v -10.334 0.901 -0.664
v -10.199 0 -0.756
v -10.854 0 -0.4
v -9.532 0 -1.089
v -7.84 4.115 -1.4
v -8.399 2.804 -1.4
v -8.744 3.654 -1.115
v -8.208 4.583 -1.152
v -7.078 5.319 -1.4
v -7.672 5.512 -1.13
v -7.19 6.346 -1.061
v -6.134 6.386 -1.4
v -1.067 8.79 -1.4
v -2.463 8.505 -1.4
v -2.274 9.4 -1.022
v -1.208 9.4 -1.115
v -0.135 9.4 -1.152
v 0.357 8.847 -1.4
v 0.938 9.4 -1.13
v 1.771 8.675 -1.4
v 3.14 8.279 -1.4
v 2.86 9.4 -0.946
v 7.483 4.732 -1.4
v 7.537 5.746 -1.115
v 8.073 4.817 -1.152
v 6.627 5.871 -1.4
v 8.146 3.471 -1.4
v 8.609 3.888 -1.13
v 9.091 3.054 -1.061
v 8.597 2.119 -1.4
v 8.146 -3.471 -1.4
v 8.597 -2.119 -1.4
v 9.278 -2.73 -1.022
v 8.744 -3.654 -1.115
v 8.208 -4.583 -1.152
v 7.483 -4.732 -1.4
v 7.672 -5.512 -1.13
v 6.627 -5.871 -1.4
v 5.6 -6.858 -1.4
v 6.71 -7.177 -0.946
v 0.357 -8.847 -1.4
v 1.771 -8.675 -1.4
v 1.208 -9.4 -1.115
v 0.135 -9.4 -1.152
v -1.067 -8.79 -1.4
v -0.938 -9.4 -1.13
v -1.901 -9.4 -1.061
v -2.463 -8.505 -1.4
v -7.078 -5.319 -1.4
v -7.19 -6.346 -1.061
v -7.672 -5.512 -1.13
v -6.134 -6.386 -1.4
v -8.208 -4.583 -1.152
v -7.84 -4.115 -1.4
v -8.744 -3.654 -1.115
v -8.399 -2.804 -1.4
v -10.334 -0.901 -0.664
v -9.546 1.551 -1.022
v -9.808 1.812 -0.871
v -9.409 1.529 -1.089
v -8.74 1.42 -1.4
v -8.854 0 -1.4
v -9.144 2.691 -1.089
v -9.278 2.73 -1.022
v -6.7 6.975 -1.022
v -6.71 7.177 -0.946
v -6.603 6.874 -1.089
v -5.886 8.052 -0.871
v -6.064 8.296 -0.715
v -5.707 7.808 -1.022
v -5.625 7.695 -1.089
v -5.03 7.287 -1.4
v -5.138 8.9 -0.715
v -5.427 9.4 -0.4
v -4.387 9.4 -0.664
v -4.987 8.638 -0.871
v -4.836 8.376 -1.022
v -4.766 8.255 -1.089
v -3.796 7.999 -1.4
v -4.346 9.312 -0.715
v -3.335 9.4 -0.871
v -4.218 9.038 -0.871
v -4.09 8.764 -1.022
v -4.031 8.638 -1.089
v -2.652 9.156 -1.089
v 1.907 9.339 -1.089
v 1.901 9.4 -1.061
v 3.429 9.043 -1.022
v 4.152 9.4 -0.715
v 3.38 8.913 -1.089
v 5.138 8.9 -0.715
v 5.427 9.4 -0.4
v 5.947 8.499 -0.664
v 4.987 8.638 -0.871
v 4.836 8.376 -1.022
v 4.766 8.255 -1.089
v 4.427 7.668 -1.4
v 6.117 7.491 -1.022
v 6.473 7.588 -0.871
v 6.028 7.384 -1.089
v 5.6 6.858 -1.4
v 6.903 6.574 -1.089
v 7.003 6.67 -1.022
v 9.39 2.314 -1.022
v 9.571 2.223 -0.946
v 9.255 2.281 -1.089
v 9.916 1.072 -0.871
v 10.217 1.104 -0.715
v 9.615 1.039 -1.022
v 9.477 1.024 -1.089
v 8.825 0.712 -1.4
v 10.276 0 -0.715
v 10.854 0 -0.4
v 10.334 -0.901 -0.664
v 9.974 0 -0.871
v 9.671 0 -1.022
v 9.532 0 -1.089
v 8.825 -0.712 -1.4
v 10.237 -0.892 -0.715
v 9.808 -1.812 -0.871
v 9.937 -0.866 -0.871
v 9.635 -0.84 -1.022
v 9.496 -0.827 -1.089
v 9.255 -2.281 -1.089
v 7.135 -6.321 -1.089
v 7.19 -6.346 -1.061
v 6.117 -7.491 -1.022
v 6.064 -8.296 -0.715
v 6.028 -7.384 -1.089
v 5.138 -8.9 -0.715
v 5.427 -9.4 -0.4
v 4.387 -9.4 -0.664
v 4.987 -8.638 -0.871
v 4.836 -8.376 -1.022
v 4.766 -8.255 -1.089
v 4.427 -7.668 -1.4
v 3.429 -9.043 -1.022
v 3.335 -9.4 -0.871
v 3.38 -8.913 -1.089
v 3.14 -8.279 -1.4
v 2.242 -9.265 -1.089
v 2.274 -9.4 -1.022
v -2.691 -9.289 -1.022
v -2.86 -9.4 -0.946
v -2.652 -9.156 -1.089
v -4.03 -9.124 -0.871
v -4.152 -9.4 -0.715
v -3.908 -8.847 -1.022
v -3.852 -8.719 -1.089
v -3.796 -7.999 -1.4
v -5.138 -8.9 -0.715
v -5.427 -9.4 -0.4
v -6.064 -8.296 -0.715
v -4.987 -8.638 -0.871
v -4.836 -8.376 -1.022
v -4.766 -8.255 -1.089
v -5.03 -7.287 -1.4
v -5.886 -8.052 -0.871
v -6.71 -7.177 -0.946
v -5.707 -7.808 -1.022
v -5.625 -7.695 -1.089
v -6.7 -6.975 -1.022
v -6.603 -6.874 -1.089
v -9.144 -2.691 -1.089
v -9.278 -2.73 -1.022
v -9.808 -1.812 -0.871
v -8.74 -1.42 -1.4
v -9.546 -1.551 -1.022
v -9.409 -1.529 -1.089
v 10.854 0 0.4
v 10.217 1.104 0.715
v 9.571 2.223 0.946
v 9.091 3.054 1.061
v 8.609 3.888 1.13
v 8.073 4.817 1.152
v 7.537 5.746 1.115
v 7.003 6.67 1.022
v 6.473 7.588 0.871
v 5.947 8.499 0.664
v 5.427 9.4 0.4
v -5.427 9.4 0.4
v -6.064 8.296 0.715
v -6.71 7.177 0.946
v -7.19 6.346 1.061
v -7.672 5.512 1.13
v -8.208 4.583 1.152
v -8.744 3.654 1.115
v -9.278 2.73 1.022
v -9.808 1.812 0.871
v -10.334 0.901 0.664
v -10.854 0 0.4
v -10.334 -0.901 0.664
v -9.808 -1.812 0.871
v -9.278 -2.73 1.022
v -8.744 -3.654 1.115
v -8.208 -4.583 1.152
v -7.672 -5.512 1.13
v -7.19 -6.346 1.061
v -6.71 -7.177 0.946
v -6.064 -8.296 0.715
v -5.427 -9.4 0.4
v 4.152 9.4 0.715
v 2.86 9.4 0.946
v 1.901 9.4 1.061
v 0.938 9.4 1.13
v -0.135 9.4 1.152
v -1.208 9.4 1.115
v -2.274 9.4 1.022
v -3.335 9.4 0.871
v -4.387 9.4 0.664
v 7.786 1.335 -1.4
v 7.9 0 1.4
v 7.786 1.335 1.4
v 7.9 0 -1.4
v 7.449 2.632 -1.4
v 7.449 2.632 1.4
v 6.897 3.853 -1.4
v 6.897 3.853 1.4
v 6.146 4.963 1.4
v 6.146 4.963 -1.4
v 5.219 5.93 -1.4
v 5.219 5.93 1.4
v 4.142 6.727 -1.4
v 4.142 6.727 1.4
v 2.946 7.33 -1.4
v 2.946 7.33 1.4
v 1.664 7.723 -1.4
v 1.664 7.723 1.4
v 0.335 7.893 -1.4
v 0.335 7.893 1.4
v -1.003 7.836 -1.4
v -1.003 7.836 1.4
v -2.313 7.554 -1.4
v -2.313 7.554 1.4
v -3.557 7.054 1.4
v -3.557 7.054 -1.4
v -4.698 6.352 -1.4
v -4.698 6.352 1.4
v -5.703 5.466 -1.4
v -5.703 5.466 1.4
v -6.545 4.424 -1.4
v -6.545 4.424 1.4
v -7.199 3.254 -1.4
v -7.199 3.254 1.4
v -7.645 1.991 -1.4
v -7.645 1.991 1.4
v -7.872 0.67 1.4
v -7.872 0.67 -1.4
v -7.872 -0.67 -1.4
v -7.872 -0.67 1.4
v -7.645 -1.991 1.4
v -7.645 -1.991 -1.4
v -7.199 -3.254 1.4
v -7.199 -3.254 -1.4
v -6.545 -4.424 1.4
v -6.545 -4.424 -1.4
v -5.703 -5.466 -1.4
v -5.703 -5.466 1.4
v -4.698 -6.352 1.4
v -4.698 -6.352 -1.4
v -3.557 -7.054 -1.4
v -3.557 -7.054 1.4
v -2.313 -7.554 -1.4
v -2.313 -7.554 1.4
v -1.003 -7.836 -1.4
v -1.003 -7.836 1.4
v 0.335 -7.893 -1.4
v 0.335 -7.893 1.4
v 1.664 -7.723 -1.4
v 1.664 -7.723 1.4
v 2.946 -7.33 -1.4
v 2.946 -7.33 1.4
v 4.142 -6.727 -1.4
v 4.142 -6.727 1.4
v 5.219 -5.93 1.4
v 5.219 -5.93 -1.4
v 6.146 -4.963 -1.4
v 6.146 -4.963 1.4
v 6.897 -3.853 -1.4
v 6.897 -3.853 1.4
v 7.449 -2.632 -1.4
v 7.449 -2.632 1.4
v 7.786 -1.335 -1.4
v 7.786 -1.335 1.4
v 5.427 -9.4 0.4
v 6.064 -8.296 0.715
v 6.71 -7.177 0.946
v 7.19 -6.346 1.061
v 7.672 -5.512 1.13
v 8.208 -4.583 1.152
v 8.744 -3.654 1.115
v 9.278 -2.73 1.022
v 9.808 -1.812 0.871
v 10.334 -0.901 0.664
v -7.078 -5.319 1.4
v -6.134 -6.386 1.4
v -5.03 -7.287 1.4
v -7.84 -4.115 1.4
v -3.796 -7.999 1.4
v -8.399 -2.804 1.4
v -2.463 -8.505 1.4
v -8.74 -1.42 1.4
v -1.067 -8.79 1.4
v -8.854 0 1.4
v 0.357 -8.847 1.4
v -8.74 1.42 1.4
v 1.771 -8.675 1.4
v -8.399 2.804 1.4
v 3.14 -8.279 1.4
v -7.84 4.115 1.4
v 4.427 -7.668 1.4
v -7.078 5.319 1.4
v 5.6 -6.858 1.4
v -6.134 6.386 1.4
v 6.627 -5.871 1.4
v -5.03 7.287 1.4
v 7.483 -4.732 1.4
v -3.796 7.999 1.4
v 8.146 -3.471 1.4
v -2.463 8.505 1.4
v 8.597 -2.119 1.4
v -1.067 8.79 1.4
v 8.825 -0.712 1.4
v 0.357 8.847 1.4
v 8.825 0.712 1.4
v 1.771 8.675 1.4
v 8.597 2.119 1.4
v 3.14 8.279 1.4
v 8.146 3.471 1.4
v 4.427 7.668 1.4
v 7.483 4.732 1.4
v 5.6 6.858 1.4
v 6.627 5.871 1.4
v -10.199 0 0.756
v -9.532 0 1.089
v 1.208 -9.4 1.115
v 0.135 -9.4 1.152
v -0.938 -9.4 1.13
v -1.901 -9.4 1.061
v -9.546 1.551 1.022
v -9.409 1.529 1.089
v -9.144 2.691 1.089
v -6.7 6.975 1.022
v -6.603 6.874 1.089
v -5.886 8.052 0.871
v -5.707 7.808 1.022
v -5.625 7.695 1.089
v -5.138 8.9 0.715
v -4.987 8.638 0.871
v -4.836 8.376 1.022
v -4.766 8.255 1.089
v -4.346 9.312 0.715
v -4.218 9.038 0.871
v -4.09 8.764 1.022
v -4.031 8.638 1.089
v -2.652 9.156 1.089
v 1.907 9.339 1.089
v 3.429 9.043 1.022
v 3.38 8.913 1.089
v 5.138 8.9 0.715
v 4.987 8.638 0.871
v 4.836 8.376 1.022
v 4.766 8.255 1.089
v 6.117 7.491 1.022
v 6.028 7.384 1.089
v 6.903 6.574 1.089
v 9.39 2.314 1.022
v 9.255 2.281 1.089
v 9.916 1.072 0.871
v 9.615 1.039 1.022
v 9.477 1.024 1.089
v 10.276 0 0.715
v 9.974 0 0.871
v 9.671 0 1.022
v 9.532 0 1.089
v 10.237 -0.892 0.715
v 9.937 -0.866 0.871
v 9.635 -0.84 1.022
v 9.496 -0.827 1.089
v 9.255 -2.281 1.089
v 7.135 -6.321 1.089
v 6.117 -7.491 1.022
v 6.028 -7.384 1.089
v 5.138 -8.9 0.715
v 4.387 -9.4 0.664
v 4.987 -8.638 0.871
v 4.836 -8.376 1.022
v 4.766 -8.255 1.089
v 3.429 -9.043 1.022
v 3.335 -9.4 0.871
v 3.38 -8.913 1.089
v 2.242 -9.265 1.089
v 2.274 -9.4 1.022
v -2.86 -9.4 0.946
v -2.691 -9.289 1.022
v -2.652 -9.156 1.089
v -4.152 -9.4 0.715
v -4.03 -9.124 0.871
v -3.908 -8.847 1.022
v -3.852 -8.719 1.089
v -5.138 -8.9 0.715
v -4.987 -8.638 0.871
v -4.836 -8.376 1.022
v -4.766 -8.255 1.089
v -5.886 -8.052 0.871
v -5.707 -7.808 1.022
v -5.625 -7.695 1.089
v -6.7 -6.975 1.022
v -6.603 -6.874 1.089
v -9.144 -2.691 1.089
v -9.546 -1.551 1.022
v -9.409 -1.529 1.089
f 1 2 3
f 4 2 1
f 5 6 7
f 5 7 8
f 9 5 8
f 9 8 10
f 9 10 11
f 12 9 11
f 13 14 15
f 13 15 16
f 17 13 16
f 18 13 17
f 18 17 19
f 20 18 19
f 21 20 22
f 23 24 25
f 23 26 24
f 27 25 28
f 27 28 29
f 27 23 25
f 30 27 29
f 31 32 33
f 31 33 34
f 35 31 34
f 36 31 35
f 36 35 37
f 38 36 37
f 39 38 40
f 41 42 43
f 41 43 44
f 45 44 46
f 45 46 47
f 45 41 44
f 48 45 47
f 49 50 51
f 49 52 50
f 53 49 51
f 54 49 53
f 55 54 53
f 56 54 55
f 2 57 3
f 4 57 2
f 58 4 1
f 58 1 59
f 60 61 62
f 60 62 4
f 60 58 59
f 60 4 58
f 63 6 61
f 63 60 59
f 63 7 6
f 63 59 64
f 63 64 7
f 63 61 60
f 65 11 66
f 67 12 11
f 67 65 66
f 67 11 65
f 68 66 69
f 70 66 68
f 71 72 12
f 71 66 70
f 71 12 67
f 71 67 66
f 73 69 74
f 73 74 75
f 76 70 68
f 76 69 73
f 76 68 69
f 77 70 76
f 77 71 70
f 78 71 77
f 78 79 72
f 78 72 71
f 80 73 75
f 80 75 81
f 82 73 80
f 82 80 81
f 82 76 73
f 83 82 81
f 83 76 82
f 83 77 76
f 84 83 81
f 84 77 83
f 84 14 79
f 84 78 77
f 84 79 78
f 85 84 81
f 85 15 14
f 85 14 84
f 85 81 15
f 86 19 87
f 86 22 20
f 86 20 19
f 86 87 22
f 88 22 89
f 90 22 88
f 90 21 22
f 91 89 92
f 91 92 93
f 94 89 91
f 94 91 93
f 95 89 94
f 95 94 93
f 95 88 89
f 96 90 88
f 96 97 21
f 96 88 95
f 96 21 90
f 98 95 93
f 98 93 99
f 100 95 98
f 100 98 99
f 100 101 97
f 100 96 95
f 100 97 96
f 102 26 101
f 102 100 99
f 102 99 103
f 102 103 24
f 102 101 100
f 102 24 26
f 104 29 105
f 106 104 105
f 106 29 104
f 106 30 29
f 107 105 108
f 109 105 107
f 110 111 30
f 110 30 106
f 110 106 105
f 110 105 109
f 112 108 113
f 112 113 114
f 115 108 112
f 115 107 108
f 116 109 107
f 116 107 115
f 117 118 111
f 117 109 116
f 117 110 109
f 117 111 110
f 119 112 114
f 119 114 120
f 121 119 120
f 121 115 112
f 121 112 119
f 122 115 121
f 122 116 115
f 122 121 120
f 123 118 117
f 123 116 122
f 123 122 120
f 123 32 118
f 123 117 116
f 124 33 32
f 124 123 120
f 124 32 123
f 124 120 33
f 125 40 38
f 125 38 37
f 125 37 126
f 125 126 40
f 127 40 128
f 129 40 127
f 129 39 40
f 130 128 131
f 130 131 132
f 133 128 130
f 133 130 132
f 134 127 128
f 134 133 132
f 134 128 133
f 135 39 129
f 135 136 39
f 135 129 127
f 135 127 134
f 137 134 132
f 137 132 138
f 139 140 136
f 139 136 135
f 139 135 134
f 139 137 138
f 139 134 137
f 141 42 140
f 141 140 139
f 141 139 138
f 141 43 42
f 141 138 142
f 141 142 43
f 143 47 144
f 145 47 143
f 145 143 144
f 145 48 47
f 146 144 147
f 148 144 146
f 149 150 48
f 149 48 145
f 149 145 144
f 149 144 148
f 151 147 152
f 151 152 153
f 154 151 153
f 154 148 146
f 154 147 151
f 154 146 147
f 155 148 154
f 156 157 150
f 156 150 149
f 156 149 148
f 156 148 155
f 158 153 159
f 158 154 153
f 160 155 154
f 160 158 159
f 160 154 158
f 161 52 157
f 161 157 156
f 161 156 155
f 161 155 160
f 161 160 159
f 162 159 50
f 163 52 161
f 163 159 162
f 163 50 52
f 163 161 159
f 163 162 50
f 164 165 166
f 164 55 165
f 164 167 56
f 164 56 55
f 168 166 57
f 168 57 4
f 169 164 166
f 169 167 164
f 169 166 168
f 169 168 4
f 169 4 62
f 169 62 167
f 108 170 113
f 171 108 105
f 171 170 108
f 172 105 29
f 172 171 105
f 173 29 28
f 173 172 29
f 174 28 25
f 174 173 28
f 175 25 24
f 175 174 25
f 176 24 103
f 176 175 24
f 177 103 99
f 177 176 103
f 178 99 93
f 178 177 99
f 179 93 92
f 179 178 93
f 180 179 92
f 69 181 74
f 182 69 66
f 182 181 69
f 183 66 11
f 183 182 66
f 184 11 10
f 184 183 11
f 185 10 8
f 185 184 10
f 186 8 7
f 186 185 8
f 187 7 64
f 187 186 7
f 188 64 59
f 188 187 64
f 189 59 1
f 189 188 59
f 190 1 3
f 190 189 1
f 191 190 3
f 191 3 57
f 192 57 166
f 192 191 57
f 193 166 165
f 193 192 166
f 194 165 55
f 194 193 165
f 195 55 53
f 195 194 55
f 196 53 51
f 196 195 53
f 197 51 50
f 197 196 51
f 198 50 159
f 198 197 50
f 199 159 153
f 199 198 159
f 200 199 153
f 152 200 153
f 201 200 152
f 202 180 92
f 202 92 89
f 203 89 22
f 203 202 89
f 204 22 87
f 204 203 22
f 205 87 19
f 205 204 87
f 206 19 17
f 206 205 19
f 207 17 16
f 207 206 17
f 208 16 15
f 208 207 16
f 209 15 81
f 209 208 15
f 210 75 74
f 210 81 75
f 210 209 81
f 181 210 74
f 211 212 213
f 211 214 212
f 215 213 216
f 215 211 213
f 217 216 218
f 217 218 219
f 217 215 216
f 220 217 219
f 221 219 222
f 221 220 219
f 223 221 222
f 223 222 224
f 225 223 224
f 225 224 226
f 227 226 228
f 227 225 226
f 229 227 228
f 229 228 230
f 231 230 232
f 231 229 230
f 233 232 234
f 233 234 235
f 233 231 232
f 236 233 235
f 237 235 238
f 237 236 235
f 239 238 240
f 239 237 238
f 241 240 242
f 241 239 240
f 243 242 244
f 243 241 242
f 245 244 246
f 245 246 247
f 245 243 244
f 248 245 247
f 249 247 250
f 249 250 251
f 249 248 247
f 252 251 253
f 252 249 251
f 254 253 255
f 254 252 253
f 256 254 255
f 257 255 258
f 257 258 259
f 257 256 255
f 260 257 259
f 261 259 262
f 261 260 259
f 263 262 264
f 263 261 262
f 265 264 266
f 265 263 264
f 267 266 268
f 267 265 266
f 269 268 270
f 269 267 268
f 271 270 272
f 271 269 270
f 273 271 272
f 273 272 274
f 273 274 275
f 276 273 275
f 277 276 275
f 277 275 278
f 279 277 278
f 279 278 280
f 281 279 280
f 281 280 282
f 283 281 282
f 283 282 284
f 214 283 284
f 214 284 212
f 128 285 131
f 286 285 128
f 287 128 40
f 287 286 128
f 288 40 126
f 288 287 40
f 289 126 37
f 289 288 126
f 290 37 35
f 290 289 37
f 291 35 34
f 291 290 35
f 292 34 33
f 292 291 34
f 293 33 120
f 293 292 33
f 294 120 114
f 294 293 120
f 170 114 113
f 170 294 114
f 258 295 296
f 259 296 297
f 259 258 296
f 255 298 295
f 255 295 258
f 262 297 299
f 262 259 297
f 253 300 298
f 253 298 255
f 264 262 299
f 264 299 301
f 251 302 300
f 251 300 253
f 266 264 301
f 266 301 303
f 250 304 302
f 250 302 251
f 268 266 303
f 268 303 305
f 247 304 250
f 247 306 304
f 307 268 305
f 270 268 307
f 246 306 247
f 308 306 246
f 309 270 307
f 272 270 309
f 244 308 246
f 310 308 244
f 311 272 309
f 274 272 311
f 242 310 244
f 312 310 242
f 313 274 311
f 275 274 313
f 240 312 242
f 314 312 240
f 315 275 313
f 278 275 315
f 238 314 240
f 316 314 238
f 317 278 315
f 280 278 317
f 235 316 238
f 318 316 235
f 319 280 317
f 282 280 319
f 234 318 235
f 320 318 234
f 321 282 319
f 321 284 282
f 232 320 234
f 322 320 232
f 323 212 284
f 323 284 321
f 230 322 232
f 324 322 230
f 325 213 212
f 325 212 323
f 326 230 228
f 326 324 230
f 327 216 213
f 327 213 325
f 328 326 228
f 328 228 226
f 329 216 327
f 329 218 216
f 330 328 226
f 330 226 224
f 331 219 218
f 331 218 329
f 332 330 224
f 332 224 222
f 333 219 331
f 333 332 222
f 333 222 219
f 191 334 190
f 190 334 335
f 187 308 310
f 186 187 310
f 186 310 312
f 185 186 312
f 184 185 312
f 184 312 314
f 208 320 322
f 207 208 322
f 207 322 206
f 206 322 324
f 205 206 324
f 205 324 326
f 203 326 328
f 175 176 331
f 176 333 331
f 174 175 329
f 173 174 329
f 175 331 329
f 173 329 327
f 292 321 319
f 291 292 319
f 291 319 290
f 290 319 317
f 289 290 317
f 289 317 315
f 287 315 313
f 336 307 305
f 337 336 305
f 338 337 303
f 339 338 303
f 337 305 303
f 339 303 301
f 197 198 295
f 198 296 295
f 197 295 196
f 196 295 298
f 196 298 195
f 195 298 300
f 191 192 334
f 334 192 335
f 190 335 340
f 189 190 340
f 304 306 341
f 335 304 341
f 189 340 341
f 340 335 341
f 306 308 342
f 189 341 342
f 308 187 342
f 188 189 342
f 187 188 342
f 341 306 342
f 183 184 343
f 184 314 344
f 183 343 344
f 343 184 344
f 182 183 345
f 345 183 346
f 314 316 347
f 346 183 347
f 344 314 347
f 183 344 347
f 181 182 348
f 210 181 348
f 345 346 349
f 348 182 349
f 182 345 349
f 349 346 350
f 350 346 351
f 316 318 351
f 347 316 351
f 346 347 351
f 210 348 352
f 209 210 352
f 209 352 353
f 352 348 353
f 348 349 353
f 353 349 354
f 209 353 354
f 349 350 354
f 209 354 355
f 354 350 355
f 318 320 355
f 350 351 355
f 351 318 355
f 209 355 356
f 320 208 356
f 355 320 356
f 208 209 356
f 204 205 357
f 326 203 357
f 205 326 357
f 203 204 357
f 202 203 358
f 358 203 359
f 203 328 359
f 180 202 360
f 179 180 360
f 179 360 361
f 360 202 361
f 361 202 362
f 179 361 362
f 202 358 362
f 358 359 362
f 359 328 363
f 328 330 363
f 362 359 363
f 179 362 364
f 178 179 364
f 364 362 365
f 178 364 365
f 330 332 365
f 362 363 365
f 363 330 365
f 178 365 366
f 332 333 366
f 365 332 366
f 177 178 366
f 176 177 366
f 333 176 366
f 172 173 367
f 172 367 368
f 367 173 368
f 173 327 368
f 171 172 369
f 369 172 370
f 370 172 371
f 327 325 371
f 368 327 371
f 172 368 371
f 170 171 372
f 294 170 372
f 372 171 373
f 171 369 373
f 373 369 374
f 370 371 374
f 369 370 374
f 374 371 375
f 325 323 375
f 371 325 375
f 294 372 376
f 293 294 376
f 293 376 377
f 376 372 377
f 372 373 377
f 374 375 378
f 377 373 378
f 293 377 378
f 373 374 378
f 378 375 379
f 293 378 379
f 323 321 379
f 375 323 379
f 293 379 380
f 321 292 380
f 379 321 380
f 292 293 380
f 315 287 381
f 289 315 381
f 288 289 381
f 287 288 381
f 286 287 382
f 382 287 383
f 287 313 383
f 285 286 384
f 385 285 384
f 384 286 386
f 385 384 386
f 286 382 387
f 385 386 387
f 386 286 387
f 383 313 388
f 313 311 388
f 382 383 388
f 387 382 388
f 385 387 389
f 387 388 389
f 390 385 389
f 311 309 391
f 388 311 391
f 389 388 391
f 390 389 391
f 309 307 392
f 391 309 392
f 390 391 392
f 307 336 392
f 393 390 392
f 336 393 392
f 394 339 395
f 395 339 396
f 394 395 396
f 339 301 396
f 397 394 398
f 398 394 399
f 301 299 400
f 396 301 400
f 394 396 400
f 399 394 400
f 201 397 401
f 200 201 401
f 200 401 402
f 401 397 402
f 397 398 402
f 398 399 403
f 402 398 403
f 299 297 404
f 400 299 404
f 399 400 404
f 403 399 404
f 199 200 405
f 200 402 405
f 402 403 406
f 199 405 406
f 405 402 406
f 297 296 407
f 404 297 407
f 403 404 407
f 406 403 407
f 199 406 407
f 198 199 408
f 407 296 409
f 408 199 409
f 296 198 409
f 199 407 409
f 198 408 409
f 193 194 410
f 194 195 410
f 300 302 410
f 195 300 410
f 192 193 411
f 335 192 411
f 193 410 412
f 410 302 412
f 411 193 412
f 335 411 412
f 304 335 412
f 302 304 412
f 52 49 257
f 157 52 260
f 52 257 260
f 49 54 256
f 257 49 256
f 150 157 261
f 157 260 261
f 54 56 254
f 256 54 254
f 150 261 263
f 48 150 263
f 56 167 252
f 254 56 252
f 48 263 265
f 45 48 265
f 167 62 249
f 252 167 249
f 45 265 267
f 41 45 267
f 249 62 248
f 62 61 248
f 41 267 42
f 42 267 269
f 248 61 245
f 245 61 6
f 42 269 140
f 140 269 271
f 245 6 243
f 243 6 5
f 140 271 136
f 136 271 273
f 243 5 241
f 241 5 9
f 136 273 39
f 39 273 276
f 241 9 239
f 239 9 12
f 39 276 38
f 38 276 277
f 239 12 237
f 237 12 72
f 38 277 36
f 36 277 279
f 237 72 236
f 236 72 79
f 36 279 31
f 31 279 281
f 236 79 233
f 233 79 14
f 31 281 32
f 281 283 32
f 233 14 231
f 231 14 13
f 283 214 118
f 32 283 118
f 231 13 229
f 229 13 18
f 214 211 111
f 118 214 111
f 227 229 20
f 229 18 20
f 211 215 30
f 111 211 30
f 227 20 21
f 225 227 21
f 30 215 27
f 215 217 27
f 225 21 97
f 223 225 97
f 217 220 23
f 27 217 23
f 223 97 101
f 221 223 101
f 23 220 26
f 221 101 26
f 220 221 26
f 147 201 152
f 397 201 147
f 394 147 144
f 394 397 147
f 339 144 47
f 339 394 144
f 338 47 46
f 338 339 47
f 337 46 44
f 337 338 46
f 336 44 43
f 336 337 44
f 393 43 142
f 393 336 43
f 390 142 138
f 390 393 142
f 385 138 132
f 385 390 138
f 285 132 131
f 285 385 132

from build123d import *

# Parameters (mm, degrees)
ESQUISSE1_R        = 7.9
BOSS_EXTRU_1_DEPTH = 1.4


with BuildPart() as part:
    # Esquisse1 → Boss.-Extru.1 (new body, symmetric)
    with BuildSketch(Plane.XY):
        Polygon((10.854185061, 0), (5.42709253, 9.4), (-5.42709253, 9.4), (-10.854185061, 0), (-5.42709253, -9.4), (5.42709253, -9.4), align=None)
        Circle(ESQUISSE1_R, mode=Mode.SUBTRACT)
    extrude(amount=BOSS_EXTRU_1_DEPTH, both=True)

    # Esquisse2 → Enlèvement de matière-Révolution1 (revolve, cut)
    with BuildSketch(Plane(origin=(0, 0, 0), x_dir=(1, 0, 0), z_dir=(0, 1, 0))):
        with BuildLine():
            Line((-10.854185061, 1.4), (-10.854185061, 0.4))
            ThreePointArc((-10.854185061, 0.4), (-9.866861873, 0.925353624), (-8.854185061, 1.4))
            Line((-8.854185061, 1.4), (-10.854185061, 1.4))
        make_face()
    enl_vement_de_mati_re_r_volution1 = revolve(axis=Axis((0, 0, 0), (0, 0, -1)), mode=Mode.SUBTRACT)

    # Symétrie1: Enlèvement de matière-Révolution1 across plane
    add(enl_vement_de_mati_re_r_volution1.mirror(Plane.XY), mode=Mode.SUBTRACT)


solid = part.part
